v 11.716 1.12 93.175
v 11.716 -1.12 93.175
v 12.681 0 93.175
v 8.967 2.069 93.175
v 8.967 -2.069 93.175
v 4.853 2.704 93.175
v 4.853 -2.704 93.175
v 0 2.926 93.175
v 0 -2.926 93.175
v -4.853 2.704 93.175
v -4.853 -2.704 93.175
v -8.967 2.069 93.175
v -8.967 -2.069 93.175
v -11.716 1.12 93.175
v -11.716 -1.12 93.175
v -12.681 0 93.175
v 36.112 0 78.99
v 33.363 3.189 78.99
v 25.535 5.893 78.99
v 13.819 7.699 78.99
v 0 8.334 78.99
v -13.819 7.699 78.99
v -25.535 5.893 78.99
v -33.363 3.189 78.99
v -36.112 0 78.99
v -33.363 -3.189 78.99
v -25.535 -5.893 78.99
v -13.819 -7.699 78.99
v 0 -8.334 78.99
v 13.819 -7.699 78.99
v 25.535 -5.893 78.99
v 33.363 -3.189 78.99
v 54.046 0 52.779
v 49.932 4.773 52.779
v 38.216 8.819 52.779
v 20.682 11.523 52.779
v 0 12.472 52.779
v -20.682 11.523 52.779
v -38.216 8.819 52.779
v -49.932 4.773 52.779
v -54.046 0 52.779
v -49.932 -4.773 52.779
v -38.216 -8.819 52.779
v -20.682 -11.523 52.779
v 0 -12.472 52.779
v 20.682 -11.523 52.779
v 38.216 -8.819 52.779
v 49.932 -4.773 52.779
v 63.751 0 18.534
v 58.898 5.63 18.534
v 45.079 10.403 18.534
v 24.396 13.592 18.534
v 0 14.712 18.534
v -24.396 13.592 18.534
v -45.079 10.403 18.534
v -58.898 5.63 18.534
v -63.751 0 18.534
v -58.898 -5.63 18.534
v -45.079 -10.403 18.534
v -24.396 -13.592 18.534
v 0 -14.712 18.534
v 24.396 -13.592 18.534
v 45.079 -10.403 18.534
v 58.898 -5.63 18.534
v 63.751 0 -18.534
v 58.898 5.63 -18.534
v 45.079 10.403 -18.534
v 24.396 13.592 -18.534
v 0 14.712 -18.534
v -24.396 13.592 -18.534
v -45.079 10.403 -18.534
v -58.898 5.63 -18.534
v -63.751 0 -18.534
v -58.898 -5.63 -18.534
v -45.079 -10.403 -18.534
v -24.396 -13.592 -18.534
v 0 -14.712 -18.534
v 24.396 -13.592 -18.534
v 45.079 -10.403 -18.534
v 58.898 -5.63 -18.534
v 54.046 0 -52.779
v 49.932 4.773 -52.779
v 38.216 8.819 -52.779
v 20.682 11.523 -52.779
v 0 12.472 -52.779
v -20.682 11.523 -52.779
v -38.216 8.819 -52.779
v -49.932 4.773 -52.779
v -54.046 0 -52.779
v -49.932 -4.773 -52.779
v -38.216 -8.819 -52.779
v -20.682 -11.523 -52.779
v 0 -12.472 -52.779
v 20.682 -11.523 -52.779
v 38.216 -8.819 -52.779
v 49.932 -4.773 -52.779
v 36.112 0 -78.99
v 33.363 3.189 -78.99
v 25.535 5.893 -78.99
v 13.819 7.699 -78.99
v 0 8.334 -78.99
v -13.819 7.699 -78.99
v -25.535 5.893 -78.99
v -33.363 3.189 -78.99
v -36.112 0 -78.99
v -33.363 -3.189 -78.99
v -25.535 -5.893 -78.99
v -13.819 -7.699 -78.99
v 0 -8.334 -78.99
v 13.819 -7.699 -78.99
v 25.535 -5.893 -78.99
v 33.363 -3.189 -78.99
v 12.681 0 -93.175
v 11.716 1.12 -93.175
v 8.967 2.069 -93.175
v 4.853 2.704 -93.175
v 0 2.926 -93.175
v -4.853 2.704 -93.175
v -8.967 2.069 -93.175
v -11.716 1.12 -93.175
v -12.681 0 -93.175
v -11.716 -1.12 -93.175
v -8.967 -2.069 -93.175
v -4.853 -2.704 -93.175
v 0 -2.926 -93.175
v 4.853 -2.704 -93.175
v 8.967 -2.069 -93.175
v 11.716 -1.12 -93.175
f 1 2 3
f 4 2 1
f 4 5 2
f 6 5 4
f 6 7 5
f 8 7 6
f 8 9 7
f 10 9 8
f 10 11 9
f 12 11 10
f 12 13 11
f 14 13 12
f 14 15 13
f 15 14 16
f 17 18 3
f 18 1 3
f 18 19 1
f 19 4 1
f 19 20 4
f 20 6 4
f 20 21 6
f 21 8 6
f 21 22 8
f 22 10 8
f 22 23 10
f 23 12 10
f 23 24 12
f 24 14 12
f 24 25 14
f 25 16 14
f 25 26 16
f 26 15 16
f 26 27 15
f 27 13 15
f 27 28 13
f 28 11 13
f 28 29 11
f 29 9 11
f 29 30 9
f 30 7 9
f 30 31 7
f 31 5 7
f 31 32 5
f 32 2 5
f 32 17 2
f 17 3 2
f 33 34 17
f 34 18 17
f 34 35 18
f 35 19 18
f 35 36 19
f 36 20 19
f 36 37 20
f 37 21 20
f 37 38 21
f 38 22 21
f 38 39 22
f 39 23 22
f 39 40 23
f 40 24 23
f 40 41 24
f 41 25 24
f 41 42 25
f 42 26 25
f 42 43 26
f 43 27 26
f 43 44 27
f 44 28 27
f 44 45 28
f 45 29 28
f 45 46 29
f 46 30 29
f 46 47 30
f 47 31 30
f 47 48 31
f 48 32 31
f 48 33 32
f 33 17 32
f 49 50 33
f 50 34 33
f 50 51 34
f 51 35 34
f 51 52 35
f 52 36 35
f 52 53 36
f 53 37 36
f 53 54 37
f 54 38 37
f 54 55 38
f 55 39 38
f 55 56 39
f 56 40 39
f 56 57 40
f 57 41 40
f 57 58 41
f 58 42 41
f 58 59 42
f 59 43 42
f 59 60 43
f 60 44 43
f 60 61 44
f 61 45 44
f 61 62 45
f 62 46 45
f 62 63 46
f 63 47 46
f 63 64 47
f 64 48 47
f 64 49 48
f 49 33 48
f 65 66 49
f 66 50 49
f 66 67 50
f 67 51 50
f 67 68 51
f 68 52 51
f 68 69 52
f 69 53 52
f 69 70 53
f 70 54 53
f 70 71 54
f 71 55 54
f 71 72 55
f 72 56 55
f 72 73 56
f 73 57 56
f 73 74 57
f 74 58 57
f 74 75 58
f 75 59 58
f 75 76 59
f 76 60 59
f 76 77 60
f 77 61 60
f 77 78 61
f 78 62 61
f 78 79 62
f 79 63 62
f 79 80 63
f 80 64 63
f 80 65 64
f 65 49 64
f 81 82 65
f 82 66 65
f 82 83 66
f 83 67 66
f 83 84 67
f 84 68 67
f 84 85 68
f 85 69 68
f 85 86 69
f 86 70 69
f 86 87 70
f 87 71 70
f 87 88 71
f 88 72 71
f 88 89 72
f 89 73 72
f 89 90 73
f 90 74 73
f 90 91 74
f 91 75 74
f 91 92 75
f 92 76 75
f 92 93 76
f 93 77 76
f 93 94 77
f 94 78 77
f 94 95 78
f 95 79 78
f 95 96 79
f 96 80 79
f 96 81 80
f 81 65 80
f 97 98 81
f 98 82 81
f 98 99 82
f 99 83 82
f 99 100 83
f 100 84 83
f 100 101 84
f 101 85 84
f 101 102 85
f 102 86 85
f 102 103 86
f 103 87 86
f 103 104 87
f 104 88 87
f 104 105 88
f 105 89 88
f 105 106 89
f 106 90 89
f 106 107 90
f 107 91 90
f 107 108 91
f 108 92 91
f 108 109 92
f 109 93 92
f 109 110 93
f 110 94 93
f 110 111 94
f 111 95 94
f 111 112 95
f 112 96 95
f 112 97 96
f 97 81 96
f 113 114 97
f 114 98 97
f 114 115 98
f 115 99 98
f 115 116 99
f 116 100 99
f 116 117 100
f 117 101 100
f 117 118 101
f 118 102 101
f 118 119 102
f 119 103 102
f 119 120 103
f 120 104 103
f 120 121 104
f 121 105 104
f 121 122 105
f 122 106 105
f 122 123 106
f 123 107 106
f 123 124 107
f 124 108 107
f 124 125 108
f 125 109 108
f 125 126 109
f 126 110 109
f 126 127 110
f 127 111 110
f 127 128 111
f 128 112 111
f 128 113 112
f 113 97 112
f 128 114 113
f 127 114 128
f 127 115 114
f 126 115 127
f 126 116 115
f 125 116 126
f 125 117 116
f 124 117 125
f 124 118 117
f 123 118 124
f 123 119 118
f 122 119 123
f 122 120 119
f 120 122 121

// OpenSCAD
// Generated by SolidPython 1.0.1 on 2020-07-29 00:46:50


scale(v = [13, 3, 19]) {
	sphere(r = 5);
}
/***********************************************
*********      SolidPython code:      **********
************************************************
 
# import packages: SolidPython
from solid import *
from solid.utils import *
from itertools import chain, combinations, permutations


class Resize:

    def __init__(self, scad_file):
        self.scad_file = scad_file
        #self.scad_file = import_scad(scad_file)
        # cone/cylinder param:
        self.r1 = 0
        self.r2 = 0
        self.h = 0
        # rectangular prism param:
        self.w = 0
        self.l = 0
        # ellipse param:
        self.r = 0

    # import OpenScad code (file name corresponds to shape)


    # classify shape + parameters
    def assign(self, param1, param2, param3):
        if self.scad_file == 'cone.scad':
            self.r1 = param1
            self.r2 = param2
            self.h = param3
        elif self.scad_file == 'cylinder.scad':
            self.r1 = param1
            self.r2 = param2
            self.h = param3
        elif self.scad_file == 'rectangularPrism.scad':
            self.h = param1
            self.l = param2
            self.w = param3
        else:
            self.r = param1
            self.h = param2

    # resize parameters
    def iterate(self):
        x = range(3, 20, 2)
        i = 1
        if self.scad_file == 'cone.scad':
            tempList = list(permutations(x, 2))
            for temp in tempList:
                param1 = temp[0]
                param2 = temp[1]
                filepath = 'produced_scad_files/' + 'cone' + str(param1) + '_' + str(param2) + '_' + '.scad'
                scad_render_to_file(cylinder(h=param1, r1=param2, r2=0), filepath)

        elif self.scad_file == 'cylinder.scad':
            tempList = list(permutations(x, 3))
            for temp in tempList:
                param1 = temp[0]
                param2 = temp[1]
                filepath = 'produced_scad_files/' + 'cylinder' + str(param1) + '_' + str(param2) + '_' + '.scad'
                scad_render_to_file(cylinder(h=param1, r1=param2, r2=param2), filepath)

        elif self.scad_file == 'rectangularPrism.scad':
            tempList = list(permutations(x, 3))
            for temp in tempList:
                param1 = temp[0]
                param2 = temp[1]
                param3 = temp[2]
                filepath = 'produced_scad_files/' + 'rectangularPrism' + str(param1) + '_' + str(param2) + '_' + str(
                    param3) + '.scad'
                scad_render_to_file(cube(size=(param1, param2, param3)), filepath)

        elif self.scad_file == 'ellipse.scad':
            tempList = list(permutations(x, 4))
            for temp in tempList:
                param1 = temp[0]
                param2 = temp[1]
                param3 = temp[2]
                param4 = temp[3]
                filepath = 'produced_scad_files/' + 'ellipse' + str(param1) + '_' + str(param2) + '_' + str(param3) + '_' + str(param4) + '.scad'
                scad_render_to_file(scale([param1, param2, param3])(sphere(r=param4)), filepath)

    def render_to_scadfile(self):
        scad_render_to_file(scad, 'example.scad') 
 
************************************************/
